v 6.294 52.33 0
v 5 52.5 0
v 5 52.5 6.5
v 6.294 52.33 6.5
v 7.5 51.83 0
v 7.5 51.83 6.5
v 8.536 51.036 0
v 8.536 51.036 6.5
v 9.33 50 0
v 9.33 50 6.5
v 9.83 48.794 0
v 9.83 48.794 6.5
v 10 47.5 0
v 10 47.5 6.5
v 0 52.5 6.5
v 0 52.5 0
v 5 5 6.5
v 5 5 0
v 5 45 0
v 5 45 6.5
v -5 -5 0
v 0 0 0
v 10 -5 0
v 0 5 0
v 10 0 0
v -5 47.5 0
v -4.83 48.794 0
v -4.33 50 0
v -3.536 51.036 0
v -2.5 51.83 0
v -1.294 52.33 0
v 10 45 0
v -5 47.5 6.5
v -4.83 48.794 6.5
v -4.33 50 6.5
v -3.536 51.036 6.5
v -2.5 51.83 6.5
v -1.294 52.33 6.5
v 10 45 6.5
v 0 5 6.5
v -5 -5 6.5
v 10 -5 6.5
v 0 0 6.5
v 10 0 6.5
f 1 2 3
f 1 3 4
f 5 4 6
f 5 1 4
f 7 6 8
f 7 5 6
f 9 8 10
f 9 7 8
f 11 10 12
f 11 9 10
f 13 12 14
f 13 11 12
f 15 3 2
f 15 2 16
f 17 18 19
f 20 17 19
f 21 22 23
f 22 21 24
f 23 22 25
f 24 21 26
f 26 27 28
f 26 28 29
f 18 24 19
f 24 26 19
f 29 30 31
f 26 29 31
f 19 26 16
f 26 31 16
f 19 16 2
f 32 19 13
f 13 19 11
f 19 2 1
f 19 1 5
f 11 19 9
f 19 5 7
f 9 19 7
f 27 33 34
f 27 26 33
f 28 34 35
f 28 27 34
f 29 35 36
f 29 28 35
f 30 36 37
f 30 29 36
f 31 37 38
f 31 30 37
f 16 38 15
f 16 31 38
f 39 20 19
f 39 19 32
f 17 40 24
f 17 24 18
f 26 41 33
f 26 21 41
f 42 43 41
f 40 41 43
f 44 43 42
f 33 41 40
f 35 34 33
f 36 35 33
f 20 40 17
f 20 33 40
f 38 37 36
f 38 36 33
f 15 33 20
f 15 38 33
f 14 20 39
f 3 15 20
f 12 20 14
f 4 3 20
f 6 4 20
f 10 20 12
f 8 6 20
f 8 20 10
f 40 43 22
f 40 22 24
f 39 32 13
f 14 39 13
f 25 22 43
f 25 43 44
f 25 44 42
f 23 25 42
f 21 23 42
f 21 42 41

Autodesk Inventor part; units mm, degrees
ref_plane "YZ Plane" through (0, 0, 0) normal (1, 0, 0) x (0, 1, 0)
ref_plane "XZ Plane" through (0, 0, 0) normal (0, 1, 0) x (-1, 0, 0)
ref_plane "XY Plane" through (0, 0, 0) normal (0, 0, 1) x (1, 0, 0)
sketch "Sketch1" plane through (0, 0, 0) normal (0, 0, 1) x (1, 0, 0)
  line L0 (0, 0) -> (-5, 0)
  line L1 (0, 0) -> (0, 5)
  line L2 (0, 5) -> (5, 5)
  line L3 (5, 5) -> (5, 45)
  line L4 (5, 45) -> (10, 45)
  line L5 (10, 45) -> (10, 47.5)
  line L6 (5, 52.5) -> (0, 52.5)
  line L7 (-5, 47.5) -> (-5, 0)
  line L8 (0, 0) -> (10, 0)
  line L9 (10, 0) -> (10, -5)
  line L10 (10, -5) -> (-5, -5)
  line L11 (-5, -5) -> (-5, 0)
  arc A0 (10, 47.5) -> (5, 52.5) centre (5, 47.5) ccw
  arc A1 (0, 52.5) -> (-5, 47.5) centre (0, 47.5) ccw
  point P0 (10, 52.5)
  point P1 (-5, 52.5)
  dimension "d0" = 5
  dimension "d1" = 5
  dimension "d2" = 5
  dimension "d3" = 40
  dimension "d4" = 5
  dimension "d5" = 7.5
  dimension "d8" = 10
  dimension "d9" = 5
  dimension "d10" = 5
extrude "Extrusion1" add sketch "Sketch1" along normal blind 6.5
properties part number "block"
